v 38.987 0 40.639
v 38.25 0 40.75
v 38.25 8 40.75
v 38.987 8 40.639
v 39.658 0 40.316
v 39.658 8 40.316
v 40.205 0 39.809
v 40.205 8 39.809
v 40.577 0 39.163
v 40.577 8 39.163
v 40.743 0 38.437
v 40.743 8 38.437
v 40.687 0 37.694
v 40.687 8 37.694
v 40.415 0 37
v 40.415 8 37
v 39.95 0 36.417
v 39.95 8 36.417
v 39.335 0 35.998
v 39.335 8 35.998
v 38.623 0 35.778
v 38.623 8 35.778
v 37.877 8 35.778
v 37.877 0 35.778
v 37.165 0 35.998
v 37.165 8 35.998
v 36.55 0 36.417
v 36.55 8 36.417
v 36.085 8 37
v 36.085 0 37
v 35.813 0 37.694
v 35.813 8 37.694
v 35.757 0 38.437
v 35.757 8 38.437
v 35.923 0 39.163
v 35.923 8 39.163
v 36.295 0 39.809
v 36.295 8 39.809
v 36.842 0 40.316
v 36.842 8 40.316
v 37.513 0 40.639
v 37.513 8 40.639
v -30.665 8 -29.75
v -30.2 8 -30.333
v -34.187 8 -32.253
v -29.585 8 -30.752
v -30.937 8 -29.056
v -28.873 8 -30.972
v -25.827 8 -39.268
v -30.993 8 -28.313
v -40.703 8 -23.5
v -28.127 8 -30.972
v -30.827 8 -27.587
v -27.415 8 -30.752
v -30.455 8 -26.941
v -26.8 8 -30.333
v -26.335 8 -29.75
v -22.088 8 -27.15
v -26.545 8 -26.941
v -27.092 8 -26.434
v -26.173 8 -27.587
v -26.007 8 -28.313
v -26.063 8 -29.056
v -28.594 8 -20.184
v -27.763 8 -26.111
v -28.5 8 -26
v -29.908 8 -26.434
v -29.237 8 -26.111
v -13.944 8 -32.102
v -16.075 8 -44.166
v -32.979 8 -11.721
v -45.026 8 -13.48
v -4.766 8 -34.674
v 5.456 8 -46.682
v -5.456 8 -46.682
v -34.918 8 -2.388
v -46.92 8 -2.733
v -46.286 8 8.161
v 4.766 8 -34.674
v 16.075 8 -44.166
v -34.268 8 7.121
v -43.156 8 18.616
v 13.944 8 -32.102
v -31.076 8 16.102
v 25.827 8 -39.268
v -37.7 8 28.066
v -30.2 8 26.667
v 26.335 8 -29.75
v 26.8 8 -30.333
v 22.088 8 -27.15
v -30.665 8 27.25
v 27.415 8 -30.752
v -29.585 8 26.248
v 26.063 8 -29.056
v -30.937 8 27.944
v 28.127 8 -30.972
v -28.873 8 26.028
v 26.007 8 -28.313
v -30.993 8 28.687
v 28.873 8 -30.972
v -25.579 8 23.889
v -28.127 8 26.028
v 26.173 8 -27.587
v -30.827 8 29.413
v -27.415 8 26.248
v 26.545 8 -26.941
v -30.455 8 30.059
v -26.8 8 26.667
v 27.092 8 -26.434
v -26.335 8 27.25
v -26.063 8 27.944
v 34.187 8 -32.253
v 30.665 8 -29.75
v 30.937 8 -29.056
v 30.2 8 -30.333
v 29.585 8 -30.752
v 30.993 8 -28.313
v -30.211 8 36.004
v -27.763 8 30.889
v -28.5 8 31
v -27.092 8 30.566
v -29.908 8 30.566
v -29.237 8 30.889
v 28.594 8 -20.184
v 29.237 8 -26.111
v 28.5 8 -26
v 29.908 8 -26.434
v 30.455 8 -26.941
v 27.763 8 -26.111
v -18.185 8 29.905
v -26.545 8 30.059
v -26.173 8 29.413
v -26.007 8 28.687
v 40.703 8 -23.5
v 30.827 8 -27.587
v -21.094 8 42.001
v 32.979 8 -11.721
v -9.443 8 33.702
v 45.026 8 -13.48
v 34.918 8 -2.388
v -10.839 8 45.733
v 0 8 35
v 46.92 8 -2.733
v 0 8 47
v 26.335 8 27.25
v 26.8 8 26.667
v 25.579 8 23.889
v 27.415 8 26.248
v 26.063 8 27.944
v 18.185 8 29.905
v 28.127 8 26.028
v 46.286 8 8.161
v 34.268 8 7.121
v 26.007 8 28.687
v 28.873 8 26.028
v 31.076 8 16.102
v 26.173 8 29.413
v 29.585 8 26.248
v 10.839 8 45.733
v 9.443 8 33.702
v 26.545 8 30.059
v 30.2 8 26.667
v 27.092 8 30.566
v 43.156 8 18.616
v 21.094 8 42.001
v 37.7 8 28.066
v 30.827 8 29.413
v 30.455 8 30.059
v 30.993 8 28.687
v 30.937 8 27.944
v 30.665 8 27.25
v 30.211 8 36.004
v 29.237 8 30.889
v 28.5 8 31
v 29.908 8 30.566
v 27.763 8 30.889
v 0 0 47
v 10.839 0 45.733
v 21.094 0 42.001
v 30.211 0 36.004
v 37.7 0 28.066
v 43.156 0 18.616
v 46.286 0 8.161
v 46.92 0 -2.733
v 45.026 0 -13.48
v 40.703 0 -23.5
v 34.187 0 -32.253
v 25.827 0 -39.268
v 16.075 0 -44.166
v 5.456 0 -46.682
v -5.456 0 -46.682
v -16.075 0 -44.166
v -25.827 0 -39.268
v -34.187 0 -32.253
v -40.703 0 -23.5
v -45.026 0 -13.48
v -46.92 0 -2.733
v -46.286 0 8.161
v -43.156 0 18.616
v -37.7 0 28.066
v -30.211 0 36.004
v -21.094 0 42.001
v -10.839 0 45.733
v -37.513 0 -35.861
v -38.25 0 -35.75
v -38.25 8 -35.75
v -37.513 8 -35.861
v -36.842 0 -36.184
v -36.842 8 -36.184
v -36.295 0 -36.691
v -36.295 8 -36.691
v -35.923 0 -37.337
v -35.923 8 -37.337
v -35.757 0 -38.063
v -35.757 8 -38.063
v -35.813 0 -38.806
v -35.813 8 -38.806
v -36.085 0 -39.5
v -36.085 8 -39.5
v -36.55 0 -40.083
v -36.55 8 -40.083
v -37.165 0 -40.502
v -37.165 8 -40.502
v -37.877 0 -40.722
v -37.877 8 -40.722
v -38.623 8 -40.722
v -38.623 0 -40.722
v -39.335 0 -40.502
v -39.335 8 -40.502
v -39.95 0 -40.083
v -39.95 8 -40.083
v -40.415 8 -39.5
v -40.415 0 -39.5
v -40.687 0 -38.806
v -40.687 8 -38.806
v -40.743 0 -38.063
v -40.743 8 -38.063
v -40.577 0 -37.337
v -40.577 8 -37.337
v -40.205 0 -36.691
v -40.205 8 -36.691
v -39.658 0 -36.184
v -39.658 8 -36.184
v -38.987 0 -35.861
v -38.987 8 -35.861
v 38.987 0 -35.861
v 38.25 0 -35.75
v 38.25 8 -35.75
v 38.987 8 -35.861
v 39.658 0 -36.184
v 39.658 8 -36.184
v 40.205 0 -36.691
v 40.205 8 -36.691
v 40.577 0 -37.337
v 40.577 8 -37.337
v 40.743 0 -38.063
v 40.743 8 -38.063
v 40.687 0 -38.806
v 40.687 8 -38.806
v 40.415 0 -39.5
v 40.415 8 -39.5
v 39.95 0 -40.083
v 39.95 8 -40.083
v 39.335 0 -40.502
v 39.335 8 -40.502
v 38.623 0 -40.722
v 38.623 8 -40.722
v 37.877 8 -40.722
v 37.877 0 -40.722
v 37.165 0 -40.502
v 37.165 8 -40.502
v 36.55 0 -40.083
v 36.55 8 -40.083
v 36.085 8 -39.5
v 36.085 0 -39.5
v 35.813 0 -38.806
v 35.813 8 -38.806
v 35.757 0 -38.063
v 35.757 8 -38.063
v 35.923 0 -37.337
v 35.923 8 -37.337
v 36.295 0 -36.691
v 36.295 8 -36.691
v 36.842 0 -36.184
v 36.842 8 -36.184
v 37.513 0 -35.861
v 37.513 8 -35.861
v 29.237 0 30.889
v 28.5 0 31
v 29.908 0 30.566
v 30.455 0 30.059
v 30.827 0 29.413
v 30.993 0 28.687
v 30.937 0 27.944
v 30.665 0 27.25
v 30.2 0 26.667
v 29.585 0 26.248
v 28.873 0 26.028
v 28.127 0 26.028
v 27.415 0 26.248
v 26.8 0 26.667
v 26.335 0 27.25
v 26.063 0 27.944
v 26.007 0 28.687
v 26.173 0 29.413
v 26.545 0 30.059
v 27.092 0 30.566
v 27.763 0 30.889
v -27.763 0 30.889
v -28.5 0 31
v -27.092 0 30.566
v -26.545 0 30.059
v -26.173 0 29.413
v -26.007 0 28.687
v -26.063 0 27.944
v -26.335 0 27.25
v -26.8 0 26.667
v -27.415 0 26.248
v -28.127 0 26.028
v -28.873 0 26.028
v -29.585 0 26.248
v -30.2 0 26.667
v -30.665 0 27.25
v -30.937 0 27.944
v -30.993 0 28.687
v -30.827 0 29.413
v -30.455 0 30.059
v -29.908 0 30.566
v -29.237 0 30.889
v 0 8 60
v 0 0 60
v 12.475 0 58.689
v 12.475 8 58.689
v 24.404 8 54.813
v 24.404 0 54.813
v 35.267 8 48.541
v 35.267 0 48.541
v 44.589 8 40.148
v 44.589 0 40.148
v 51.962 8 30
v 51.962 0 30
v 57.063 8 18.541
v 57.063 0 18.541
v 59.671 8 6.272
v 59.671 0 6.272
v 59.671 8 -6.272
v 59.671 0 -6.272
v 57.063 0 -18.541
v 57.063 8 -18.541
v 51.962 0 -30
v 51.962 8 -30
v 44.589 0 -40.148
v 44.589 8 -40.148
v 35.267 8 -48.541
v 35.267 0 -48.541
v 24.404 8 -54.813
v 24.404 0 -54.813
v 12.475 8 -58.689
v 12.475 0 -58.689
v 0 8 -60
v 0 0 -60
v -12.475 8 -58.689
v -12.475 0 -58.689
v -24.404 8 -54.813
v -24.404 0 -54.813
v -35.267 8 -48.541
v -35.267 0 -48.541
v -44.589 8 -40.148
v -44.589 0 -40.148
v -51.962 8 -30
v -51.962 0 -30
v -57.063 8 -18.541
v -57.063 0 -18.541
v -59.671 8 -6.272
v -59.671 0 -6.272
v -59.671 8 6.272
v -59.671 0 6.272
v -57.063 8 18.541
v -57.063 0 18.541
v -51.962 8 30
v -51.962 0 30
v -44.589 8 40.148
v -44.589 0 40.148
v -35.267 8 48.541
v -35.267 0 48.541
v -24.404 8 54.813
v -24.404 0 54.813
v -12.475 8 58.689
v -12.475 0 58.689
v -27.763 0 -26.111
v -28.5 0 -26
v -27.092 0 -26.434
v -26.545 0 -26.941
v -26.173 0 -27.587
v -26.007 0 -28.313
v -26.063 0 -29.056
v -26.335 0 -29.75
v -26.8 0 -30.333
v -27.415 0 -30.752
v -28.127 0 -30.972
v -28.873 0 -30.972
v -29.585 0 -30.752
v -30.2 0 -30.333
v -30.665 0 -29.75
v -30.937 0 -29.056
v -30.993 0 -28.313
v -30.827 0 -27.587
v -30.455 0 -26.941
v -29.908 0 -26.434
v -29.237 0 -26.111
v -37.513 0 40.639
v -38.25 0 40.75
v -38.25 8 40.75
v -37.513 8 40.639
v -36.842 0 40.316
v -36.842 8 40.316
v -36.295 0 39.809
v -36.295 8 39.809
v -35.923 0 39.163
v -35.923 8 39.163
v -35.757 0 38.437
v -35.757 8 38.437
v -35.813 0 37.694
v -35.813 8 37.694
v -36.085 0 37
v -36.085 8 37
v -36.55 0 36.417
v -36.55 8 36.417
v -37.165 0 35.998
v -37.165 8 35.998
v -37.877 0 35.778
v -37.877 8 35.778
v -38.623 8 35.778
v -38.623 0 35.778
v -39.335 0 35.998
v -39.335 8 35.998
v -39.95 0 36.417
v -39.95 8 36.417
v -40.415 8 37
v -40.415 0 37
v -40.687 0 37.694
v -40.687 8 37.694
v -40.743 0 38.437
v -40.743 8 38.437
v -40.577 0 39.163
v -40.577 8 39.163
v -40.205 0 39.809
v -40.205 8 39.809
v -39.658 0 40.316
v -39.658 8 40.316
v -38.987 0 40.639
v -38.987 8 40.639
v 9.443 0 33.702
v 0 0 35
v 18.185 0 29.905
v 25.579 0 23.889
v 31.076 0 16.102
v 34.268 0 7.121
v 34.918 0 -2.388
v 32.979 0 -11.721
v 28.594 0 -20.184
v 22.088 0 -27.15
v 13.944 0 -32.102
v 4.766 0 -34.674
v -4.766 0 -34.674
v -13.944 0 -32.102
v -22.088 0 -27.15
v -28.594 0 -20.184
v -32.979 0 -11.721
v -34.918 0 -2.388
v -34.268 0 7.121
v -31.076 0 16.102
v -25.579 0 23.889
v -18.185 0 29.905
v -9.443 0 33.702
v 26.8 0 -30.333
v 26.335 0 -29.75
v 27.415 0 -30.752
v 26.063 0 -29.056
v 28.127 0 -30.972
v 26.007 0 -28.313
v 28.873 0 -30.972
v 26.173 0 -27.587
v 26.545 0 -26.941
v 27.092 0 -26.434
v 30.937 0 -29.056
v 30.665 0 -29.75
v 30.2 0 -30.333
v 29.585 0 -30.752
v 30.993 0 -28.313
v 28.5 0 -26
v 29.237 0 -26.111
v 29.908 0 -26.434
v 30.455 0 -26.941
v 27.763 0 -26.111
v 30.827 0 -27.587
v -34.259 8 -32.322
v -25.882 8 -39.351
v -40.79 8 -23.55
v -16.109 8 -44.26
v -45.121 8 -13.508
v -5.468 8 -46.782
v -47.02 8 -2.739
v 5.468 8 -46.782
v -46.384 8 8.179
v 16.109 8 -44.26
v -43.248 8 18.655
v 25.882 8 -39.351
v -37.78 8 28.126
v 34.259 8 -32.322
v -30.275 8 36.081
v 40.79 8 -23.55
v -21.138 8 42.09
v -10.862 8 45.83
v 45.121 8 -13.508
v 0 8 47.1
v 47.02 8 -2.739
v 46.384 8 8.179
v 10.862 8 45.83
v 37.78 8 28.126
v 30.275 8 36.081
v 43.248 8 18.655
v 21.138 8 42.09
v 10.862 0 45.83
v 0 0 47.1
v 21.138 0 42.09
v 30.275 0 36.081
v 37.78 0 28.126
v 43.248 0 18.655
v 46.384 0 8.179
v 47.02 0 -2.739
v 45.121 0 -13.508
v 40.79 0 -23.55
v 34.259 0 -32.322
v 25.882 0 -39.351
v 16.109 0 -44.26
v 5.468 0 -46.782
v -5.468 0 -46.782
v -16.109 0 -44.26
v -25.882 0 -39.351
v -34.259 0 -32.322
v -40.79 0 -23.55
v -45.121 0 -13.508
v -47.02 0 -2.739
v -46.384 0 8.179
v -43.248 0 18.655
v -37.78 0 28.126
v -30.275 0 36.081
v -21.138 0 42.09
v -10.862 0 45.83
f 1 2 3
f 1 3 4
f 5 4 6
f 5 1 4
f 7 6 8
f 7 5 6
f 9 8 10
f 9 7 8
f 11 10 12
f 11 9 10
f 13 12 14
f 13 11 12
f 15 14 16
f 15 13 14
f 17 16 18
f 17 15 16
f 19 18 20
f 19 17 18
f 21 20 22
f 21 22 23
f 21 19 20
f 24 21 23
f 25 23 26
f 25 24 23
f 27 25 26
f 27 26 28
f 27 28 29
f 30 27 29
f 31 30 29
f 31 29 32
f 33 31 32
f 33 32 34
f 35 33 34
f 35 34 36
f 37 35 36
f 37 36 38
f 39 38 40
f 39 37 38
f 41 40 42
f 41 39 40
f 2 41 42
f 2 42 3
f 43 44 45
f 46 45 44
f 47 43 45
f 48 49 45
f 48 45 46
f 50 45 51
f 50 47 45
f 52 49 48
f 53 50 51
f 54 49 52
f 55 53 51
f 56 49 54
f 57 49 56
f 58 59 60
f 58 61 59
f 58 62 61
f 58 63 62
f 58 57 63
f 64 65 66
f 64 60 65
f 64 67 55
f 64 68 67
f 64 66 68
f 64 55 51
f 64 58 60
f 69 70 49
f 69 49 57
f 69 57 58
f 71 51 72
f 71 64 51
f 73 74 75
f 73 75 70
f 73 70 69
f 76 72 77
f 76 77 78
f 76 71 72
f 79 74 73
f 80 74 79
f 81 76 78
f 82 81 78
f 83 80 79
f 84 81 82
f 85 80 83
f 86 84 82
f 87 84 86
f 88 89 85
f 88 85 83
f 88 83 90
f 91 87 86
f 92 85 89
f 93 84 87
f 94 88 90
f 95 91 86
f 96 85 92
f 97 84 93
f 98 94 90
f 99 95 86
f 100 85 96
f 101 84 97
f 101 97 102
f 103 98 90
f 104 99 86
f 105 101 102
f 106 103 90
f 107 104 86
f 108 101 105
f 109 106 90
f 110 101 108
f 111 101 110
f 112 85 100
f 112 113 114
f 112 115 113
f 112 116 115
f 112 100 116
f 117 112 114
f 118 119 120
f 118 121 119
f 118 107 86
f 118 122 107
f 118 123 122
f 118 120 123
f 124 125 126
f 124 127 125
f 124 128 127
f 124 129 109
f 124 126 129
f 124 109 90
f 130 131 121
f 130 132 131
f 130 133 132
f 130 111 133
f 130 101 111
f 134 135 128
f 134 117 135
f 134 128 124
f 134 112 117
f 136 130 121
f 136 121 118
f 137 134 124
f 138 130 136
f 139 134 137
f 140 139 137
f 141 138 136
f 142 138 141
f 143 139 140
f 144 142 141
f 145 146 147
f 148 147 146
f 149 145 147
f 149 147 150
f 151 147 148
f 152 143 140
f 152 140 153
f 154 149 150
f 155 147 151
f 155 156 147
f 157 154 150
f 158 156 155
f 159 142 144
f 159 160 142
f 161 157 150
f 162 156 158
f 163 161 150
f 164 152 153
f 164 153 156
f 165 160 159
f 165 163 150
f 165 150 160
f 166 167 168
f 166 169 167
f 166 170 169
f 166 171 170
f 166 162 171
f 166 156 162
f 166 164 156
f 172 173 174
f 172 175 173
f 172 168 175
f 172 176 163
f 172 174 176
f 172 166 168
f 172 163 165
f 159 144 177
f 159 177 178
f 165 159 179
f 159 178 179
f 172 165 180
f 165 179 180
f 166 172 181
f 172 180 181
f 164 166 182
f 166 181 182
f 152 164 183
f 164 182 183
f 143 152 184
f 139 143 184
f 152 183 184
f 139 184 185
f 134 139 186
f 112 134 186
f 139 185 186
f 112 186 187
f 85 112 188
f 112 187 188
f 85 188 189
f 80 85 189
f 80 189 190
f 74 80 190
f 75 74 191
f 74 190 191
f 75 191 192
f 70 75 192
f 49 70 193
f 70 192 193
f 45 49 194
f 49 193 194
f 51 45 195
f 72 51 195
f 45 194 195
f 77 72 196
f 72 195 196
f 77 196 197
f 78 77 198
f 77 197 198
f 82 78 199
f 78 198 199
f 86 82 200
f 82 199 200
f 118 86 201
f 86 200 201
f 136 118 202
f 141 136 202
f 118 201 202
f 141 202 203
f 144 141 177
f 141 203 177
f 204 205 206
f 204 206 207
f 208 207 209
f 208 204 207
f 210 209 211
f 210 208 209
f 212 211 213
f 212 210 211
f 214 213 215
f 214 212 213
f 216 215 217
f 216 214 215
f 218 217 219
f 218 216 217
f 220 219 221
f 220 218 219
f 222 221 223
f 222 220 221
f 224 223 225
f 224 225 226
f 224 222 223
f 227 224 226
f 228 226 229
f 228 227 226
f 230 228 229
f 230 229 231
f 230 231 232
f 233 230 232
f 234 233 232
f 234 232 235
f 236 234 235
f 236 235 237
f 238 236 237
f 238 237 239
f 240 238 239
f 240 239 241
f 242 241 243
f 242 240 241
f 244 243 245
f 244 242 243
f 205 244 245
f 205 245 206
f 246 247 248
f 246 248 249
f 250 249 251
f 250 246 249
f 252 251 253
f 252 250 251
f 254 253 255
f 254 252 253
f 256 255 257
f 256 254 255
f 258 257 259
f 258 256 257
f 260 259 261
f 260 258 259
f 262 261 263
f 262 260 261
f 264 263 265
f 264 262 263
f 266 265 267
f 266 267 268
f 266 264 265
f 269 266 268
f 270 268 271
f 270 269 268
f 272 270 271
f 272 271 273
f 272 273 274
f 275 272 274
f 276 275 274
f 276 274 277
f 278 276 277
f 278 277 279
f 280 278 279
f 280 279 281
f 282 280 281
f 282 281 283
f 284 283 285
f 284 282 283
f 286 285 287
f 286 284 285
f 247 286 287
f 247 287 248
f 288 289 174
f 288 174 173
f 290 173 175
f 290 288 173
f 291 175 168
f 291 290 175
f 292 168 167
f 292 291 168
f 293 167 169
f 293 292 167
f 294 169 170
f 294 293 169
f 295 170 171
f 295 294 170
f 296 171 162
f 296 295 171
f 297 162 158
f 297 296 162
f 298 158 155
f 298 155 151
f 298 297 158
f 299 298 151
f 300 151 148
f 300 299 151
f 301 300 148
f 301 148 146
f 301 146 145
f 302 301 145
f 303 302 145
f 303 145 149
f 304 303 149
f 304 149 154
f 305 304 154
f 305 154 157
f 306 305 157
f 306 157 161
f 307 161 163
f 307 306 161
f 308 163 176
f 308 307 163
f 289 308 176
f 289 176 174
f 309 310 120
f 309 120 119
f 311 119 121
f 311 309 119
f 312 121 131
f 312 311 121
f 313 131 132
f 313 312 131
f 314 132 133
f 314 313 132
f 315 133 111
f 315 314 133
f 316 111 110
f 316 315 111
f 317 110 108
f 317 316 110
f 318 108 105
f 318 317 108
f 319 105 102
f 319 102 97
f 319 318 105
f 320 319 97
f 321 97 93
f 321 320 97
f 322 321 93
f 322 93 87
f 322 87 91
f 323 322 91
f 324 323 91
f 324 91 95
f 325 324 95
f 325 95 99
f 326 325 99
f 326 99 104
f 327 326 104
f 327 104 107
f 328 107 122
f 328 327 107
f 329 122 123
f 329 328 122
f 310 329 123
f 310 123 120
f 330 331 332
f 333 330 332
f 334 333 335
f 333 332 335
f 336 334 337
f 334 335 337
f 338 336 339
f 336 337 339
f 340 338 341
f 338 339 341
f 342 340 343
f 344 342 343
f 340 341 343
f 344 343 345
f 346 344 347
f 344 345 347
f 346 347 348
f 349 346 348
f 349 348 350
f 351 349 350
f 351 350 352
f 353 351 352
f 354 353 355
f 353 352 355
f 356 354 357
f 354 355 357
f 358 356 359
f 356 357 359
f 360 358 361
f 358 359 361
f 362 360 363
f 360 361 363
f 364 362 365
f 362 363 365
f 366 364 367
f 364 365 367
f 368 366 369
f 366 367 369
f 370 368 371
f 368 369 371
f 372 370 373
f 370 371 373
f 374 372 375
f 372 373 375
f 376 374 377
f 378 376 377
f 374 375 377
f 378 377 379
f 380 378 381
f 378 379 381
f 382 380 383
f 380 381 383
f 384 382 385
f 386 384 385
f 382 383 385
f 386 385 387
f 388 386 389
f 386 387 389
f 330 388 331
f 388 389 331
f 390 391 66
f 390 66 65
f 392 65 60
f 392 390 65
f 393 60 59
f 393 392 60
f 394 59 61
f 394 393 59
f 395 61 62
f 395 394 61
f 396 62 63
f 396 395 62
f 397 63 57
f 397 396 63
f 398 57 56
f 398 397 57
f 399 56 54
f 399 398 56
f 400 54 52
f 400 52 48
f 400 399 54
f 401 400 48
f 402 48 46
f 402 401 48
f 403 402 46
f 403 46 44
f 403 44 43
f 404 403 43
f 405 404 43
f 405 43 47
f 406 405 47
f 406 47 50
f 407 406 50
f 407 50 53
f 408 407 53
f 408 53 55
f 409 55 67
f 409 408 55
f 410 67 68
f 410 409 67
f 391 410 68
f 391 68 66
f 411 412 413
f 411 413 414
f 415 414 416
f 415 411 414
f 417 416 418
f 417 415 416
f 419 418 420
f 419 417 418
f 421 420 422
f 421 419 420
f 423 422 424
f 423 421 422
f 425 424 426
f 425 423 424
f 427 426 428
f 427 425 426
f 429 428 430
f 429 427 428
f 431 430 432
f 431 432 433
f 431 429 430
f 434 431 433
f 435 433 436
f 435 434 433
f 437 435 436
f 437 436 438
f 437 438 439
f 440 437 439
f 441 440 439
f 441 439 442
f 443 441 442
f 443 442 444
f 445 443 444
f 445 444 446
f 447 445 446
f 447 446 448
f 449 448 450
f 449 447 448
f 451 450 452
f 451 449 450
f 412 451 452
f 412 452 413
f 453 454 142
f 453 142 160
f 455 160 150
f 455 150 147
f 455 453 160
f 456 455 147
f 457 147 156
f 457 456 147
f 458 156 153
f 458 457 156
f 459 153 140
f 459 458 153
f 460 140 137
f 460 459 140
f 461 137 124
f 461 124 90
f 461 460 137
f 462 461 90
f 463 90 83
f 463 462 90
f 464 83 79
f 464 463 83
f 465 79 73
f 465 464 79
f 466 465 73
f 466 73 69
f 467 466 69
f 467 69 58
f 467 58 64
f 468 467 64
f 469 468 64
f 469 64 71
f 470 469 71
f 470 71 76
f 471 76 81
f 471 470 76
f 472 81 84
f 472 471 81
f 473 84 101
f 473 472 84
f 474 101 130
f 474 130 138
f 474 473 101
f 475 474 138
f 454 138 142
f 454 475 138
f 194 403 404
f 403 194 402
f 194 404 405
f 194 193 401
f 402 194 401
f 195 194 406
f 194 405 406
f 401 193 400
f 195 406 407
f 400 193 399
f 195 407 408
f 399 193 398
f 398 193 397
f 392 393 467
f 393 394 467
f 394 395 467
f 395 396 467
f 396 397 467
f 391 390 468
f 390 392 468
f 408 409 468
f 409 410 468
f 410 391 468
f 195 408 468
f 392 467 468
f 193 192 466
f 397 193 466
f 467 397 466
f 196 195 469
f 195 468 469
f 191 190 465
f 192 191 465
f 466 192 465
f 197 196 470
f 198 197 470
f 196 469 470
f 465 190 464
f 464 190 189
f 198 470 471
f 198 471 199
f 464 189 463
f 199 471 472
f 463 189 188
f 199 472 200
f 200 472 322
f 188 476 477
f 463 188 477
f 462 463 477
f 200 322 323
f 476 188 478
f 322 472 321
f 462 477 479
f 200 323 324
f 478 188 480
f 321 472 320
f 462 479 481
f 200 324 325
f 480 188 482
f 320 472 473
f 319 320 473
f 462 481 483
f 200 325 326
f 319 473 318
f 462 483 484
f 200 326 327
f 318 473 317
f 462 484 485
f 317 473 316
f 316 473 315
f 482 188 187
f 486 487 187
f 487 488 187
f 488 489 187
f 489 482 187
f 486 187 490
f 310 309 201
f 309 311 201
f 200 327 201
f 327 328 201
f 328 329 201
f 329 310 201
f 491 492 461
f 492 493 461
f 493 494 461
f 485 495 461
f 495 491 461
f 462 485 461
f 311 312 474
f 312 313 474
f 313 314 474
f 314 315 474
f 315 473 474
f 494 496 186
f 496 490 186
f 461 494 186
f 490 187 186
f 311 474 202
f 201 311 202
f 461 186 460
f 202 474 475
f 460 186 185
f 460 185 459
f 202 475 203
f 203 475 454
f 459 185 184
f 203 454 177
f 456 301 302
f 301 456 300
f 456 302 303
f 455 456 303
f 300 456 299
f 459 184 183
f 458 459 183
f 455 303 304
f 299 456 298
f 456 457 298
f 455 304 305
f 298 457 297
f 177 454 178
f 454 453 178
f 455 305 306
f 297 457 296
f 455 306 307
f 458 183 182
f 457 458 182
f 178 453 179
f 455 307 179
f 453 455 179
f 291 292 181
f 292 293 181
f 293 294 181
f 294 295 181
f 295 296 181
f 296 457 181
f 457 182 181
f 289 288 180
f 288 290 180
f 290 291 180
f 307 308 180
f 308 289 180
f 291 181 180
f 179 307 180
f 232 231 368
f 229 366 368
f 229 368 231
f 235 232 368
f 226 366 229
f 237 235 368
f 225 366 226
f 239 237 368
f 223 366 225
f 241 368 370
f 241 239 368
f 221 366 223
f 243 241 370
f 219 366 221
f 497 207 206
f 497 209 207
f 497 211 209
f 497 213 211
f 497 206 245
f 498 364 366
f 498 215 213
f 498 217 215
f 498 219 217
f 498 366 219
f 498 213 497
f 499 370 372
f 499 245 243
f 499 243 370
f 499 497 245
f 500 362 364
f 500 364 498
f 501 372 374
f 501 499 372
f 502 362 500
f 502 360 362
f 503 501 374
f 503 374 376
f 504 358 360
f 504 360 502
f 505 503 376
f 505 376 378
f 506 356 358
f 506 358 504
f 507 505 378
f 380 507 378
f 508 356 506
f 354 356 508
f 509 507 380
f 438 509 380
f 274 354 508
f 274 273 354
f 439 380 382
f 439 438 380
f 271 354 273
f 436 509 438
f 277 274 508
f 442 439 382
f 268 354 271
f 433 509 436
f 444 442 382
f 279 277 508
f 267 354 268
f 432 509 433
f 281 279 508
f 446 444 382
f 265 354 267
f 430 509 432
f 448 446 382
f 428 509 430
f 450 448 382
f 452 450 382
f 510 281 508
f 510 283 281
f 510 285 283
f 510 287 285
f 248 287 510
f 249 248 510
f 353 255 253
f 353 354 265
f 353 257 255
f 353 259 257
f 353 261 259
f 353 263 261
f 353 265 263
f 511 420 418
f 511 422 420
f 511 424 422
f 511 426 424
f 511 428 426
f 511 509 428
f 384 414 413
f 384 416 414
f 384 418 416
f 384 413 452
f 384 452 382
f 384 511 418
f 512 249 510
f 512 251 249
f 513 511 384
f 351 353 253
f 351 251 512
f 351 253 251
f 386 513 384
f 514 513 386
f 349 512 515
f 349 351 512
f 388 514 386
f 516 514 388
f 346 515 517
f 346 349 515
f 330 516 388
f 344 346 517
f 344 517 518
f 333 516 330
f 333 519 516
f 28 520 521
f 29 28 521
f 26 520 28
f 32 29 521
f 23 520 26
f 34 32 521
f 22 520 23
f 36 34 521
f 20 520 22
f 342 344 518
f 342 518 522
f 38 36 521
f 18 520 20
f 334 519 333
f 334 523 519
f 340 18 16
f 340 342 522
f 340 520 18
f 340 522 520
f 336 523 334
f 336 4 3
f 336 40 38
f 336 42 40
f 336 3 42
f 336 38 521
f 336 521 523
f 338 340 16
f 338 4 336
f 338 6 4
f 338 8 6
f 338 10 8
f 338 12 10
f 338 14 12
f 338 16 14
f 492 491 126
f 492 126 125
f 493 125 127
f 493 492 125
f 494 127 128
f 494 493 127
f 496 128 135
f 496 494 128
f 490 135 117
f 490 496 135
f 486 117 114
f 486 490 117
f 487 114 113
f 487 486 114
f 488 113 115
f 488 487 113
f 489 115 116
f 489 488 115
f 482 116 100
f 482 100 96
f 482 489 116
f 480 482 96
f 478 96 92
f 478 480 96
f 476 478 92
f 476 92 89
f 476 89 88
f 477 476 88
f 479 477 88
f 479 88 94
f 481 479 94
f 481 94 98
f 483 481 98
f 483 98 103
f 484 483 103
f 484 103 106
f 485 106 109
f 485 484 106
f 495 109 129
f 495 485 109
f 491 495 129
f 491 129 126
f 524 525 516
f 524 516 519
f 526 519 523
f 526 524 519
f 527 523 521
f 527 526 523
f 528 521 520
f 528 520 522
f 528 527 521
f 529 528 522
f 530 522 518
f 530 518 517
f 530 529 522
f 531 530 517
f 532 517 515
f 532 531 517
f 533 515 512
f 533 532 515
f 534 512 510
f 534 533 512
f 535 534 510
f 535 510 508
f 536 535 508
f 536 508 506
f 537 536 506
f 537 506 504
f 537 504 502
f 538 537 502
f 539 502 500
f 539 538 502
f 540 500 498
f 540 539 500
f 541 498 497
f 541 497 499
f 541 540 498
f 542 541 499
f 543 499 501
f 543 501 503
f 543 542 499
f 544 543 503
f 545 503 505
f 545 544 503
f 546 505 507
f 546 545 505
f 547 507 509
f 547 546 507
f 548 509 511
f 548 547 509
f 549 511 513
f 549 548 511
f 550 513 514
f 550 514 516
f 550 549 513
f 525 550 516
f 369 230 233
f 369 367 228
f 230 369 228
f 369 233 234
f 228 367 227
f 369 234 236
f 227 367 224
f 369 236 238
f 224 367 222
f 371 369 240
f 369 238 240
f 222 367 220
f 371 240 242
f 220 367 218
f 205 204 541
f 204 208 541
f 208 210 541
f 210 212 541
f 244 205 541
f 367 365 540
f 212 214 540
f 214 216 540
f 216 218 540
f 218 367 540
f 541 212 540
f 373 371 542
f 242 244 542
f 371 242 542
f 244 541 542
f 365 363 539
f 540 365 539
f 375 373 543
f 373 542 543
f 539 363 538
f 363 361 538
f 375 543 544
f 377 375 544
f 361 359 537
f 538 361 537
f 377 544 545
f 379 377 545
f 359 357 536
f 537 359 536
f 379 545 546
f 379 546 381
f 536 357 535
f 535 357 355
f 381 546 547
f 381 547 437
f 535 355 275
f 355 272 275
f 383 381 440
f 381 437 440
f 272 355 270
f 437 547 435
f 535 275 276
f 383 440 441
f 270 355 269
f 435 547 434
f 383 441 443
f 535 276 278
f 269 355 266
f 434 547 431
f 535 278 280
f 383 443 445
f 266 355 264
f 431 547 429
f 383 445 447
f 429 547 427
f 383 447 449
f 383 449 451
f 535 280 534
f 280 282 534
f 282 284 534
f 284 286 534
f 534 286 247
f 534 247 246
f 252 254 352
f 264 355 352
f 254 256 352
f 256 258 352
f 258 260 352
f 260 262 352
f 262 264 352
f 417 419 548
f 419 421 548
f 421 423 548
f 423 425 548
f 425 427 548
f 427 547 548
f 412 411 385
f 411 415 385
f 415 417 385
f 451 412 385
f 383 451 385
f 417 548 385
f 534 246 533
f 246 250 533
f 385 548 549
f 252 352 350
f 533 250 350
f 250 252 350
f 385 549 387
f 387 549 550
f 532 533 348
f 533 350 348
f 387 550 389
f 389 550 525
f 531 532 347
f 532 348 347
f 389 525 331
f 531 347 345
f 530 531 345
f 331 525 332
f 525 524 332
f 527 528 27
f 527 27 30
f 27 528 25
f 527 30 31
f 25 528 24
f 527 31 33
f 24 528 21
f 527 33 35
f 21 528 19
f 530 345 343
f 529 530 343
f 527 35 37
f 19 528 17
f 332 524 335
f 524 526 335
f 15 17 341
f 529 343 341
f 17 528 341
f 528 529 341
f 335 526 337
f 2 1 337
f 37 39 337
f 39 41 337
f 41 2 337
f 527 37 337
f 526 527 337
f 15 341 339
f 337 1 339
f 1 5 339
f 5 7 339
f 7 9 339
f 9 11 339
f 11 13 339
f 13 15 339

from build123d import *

# Parameters (mm, degrees)
SKETCH1_R           = 47
SKETCH1_R_2         = 2.5
SKETCH1_R_3         = 35
BOSS_EXTRUDE2_DEPTH = 8
SKETCH1_4_R         = 60
SKETCH1_4_R_2       = 2.5
SKETCH1_4_R_3       = 47.1
BOSS_EXTRUDE3_DEPTH = 8


with BuildPart() as part:
    # Sketch1 → Boss-Extrude2 (new body)
    with BuildSketch(Plane(origin=(0, 0, 0), x_dir=(1, 0, 0), z_dir=(0, 1, 0))):
        with Locations(Location((0, 0, 0), (0, 0, 270))):
            Circle(SKETCH1_R)
        with Locations(Location((28.5, -28.5, 0), (0, 0, 270))):
            Circle(SKETCH1_R_2, mode=Mode.SUBTRACT)
        with Locations(Location((-28.5, 28.5, 0), (0, 0, 270))):
            Circle(SKETCH1_R_2, mode=Mode.SUBTRACT)
        with Locations(Location((28.5, 28.5, 0), (0, 0, 270))):
            Circle(SKETCH1_R_2, mode=Mode.SUBTRACT)
        with Locations(Location((0, 0, 0), (0, 0, 270))):
            Circle(SKETCH1_R_3, mode=Mode.SUBTRACT)
        with Locations(Location((-28.5, -28.5, 0), (0, 0, 270))):
            Circle(SKETCH1_R_2, mode=Mode.SUBTRACT)
    extrude(amount=BOSS_EXTRUDE2_DEPTH)


with BuildPart() as body_2:
    # Sketch1<4> → Boss-Extrude3 (new body)
    with BuildSketch(Plane(origin=(0, 0, 0), x_dir=(1, 0, 0), z_dir=(0, 1, 0))):
        with Locations(Location((0, 0, 0), (0, 0, 270))):
            Circle(SKETCH1_4_R)
        with Locations(Location((-38.25, 38.25, 0), (0, 0, 270))):
            Circle(SKETCH1_4_R_2, mode=Mode.SUBTRACT)
        with Locations(Location((38.25, 38.25, 0), (0, 0, 270))):
            Circle(SKETCH1_4_R_2, mode=Mode.SUBTRACT)
        with Locations(Location((38.25, -38.25, 0), (0, 0, 270))):
            Circle(SKETCH1_4_R_2, mode=Mode.SUBTRACT)
        with Locations(Location((-38.25, -38.25, 0), (0, 0, 270))):
            Circle(SKETCH1_4_R_2, mode=Mode.SUBTRACT)
        with Locations(Location((0, 0, 0), (0, 0, 270))):
            Circle(SKETCH1_4_R_3, mode=Mode.SUBTRACT)
    extrude(amount=BOSS_EXTRUDE3_DEPTH)


solid = Compound([part.part, body_2.part])
